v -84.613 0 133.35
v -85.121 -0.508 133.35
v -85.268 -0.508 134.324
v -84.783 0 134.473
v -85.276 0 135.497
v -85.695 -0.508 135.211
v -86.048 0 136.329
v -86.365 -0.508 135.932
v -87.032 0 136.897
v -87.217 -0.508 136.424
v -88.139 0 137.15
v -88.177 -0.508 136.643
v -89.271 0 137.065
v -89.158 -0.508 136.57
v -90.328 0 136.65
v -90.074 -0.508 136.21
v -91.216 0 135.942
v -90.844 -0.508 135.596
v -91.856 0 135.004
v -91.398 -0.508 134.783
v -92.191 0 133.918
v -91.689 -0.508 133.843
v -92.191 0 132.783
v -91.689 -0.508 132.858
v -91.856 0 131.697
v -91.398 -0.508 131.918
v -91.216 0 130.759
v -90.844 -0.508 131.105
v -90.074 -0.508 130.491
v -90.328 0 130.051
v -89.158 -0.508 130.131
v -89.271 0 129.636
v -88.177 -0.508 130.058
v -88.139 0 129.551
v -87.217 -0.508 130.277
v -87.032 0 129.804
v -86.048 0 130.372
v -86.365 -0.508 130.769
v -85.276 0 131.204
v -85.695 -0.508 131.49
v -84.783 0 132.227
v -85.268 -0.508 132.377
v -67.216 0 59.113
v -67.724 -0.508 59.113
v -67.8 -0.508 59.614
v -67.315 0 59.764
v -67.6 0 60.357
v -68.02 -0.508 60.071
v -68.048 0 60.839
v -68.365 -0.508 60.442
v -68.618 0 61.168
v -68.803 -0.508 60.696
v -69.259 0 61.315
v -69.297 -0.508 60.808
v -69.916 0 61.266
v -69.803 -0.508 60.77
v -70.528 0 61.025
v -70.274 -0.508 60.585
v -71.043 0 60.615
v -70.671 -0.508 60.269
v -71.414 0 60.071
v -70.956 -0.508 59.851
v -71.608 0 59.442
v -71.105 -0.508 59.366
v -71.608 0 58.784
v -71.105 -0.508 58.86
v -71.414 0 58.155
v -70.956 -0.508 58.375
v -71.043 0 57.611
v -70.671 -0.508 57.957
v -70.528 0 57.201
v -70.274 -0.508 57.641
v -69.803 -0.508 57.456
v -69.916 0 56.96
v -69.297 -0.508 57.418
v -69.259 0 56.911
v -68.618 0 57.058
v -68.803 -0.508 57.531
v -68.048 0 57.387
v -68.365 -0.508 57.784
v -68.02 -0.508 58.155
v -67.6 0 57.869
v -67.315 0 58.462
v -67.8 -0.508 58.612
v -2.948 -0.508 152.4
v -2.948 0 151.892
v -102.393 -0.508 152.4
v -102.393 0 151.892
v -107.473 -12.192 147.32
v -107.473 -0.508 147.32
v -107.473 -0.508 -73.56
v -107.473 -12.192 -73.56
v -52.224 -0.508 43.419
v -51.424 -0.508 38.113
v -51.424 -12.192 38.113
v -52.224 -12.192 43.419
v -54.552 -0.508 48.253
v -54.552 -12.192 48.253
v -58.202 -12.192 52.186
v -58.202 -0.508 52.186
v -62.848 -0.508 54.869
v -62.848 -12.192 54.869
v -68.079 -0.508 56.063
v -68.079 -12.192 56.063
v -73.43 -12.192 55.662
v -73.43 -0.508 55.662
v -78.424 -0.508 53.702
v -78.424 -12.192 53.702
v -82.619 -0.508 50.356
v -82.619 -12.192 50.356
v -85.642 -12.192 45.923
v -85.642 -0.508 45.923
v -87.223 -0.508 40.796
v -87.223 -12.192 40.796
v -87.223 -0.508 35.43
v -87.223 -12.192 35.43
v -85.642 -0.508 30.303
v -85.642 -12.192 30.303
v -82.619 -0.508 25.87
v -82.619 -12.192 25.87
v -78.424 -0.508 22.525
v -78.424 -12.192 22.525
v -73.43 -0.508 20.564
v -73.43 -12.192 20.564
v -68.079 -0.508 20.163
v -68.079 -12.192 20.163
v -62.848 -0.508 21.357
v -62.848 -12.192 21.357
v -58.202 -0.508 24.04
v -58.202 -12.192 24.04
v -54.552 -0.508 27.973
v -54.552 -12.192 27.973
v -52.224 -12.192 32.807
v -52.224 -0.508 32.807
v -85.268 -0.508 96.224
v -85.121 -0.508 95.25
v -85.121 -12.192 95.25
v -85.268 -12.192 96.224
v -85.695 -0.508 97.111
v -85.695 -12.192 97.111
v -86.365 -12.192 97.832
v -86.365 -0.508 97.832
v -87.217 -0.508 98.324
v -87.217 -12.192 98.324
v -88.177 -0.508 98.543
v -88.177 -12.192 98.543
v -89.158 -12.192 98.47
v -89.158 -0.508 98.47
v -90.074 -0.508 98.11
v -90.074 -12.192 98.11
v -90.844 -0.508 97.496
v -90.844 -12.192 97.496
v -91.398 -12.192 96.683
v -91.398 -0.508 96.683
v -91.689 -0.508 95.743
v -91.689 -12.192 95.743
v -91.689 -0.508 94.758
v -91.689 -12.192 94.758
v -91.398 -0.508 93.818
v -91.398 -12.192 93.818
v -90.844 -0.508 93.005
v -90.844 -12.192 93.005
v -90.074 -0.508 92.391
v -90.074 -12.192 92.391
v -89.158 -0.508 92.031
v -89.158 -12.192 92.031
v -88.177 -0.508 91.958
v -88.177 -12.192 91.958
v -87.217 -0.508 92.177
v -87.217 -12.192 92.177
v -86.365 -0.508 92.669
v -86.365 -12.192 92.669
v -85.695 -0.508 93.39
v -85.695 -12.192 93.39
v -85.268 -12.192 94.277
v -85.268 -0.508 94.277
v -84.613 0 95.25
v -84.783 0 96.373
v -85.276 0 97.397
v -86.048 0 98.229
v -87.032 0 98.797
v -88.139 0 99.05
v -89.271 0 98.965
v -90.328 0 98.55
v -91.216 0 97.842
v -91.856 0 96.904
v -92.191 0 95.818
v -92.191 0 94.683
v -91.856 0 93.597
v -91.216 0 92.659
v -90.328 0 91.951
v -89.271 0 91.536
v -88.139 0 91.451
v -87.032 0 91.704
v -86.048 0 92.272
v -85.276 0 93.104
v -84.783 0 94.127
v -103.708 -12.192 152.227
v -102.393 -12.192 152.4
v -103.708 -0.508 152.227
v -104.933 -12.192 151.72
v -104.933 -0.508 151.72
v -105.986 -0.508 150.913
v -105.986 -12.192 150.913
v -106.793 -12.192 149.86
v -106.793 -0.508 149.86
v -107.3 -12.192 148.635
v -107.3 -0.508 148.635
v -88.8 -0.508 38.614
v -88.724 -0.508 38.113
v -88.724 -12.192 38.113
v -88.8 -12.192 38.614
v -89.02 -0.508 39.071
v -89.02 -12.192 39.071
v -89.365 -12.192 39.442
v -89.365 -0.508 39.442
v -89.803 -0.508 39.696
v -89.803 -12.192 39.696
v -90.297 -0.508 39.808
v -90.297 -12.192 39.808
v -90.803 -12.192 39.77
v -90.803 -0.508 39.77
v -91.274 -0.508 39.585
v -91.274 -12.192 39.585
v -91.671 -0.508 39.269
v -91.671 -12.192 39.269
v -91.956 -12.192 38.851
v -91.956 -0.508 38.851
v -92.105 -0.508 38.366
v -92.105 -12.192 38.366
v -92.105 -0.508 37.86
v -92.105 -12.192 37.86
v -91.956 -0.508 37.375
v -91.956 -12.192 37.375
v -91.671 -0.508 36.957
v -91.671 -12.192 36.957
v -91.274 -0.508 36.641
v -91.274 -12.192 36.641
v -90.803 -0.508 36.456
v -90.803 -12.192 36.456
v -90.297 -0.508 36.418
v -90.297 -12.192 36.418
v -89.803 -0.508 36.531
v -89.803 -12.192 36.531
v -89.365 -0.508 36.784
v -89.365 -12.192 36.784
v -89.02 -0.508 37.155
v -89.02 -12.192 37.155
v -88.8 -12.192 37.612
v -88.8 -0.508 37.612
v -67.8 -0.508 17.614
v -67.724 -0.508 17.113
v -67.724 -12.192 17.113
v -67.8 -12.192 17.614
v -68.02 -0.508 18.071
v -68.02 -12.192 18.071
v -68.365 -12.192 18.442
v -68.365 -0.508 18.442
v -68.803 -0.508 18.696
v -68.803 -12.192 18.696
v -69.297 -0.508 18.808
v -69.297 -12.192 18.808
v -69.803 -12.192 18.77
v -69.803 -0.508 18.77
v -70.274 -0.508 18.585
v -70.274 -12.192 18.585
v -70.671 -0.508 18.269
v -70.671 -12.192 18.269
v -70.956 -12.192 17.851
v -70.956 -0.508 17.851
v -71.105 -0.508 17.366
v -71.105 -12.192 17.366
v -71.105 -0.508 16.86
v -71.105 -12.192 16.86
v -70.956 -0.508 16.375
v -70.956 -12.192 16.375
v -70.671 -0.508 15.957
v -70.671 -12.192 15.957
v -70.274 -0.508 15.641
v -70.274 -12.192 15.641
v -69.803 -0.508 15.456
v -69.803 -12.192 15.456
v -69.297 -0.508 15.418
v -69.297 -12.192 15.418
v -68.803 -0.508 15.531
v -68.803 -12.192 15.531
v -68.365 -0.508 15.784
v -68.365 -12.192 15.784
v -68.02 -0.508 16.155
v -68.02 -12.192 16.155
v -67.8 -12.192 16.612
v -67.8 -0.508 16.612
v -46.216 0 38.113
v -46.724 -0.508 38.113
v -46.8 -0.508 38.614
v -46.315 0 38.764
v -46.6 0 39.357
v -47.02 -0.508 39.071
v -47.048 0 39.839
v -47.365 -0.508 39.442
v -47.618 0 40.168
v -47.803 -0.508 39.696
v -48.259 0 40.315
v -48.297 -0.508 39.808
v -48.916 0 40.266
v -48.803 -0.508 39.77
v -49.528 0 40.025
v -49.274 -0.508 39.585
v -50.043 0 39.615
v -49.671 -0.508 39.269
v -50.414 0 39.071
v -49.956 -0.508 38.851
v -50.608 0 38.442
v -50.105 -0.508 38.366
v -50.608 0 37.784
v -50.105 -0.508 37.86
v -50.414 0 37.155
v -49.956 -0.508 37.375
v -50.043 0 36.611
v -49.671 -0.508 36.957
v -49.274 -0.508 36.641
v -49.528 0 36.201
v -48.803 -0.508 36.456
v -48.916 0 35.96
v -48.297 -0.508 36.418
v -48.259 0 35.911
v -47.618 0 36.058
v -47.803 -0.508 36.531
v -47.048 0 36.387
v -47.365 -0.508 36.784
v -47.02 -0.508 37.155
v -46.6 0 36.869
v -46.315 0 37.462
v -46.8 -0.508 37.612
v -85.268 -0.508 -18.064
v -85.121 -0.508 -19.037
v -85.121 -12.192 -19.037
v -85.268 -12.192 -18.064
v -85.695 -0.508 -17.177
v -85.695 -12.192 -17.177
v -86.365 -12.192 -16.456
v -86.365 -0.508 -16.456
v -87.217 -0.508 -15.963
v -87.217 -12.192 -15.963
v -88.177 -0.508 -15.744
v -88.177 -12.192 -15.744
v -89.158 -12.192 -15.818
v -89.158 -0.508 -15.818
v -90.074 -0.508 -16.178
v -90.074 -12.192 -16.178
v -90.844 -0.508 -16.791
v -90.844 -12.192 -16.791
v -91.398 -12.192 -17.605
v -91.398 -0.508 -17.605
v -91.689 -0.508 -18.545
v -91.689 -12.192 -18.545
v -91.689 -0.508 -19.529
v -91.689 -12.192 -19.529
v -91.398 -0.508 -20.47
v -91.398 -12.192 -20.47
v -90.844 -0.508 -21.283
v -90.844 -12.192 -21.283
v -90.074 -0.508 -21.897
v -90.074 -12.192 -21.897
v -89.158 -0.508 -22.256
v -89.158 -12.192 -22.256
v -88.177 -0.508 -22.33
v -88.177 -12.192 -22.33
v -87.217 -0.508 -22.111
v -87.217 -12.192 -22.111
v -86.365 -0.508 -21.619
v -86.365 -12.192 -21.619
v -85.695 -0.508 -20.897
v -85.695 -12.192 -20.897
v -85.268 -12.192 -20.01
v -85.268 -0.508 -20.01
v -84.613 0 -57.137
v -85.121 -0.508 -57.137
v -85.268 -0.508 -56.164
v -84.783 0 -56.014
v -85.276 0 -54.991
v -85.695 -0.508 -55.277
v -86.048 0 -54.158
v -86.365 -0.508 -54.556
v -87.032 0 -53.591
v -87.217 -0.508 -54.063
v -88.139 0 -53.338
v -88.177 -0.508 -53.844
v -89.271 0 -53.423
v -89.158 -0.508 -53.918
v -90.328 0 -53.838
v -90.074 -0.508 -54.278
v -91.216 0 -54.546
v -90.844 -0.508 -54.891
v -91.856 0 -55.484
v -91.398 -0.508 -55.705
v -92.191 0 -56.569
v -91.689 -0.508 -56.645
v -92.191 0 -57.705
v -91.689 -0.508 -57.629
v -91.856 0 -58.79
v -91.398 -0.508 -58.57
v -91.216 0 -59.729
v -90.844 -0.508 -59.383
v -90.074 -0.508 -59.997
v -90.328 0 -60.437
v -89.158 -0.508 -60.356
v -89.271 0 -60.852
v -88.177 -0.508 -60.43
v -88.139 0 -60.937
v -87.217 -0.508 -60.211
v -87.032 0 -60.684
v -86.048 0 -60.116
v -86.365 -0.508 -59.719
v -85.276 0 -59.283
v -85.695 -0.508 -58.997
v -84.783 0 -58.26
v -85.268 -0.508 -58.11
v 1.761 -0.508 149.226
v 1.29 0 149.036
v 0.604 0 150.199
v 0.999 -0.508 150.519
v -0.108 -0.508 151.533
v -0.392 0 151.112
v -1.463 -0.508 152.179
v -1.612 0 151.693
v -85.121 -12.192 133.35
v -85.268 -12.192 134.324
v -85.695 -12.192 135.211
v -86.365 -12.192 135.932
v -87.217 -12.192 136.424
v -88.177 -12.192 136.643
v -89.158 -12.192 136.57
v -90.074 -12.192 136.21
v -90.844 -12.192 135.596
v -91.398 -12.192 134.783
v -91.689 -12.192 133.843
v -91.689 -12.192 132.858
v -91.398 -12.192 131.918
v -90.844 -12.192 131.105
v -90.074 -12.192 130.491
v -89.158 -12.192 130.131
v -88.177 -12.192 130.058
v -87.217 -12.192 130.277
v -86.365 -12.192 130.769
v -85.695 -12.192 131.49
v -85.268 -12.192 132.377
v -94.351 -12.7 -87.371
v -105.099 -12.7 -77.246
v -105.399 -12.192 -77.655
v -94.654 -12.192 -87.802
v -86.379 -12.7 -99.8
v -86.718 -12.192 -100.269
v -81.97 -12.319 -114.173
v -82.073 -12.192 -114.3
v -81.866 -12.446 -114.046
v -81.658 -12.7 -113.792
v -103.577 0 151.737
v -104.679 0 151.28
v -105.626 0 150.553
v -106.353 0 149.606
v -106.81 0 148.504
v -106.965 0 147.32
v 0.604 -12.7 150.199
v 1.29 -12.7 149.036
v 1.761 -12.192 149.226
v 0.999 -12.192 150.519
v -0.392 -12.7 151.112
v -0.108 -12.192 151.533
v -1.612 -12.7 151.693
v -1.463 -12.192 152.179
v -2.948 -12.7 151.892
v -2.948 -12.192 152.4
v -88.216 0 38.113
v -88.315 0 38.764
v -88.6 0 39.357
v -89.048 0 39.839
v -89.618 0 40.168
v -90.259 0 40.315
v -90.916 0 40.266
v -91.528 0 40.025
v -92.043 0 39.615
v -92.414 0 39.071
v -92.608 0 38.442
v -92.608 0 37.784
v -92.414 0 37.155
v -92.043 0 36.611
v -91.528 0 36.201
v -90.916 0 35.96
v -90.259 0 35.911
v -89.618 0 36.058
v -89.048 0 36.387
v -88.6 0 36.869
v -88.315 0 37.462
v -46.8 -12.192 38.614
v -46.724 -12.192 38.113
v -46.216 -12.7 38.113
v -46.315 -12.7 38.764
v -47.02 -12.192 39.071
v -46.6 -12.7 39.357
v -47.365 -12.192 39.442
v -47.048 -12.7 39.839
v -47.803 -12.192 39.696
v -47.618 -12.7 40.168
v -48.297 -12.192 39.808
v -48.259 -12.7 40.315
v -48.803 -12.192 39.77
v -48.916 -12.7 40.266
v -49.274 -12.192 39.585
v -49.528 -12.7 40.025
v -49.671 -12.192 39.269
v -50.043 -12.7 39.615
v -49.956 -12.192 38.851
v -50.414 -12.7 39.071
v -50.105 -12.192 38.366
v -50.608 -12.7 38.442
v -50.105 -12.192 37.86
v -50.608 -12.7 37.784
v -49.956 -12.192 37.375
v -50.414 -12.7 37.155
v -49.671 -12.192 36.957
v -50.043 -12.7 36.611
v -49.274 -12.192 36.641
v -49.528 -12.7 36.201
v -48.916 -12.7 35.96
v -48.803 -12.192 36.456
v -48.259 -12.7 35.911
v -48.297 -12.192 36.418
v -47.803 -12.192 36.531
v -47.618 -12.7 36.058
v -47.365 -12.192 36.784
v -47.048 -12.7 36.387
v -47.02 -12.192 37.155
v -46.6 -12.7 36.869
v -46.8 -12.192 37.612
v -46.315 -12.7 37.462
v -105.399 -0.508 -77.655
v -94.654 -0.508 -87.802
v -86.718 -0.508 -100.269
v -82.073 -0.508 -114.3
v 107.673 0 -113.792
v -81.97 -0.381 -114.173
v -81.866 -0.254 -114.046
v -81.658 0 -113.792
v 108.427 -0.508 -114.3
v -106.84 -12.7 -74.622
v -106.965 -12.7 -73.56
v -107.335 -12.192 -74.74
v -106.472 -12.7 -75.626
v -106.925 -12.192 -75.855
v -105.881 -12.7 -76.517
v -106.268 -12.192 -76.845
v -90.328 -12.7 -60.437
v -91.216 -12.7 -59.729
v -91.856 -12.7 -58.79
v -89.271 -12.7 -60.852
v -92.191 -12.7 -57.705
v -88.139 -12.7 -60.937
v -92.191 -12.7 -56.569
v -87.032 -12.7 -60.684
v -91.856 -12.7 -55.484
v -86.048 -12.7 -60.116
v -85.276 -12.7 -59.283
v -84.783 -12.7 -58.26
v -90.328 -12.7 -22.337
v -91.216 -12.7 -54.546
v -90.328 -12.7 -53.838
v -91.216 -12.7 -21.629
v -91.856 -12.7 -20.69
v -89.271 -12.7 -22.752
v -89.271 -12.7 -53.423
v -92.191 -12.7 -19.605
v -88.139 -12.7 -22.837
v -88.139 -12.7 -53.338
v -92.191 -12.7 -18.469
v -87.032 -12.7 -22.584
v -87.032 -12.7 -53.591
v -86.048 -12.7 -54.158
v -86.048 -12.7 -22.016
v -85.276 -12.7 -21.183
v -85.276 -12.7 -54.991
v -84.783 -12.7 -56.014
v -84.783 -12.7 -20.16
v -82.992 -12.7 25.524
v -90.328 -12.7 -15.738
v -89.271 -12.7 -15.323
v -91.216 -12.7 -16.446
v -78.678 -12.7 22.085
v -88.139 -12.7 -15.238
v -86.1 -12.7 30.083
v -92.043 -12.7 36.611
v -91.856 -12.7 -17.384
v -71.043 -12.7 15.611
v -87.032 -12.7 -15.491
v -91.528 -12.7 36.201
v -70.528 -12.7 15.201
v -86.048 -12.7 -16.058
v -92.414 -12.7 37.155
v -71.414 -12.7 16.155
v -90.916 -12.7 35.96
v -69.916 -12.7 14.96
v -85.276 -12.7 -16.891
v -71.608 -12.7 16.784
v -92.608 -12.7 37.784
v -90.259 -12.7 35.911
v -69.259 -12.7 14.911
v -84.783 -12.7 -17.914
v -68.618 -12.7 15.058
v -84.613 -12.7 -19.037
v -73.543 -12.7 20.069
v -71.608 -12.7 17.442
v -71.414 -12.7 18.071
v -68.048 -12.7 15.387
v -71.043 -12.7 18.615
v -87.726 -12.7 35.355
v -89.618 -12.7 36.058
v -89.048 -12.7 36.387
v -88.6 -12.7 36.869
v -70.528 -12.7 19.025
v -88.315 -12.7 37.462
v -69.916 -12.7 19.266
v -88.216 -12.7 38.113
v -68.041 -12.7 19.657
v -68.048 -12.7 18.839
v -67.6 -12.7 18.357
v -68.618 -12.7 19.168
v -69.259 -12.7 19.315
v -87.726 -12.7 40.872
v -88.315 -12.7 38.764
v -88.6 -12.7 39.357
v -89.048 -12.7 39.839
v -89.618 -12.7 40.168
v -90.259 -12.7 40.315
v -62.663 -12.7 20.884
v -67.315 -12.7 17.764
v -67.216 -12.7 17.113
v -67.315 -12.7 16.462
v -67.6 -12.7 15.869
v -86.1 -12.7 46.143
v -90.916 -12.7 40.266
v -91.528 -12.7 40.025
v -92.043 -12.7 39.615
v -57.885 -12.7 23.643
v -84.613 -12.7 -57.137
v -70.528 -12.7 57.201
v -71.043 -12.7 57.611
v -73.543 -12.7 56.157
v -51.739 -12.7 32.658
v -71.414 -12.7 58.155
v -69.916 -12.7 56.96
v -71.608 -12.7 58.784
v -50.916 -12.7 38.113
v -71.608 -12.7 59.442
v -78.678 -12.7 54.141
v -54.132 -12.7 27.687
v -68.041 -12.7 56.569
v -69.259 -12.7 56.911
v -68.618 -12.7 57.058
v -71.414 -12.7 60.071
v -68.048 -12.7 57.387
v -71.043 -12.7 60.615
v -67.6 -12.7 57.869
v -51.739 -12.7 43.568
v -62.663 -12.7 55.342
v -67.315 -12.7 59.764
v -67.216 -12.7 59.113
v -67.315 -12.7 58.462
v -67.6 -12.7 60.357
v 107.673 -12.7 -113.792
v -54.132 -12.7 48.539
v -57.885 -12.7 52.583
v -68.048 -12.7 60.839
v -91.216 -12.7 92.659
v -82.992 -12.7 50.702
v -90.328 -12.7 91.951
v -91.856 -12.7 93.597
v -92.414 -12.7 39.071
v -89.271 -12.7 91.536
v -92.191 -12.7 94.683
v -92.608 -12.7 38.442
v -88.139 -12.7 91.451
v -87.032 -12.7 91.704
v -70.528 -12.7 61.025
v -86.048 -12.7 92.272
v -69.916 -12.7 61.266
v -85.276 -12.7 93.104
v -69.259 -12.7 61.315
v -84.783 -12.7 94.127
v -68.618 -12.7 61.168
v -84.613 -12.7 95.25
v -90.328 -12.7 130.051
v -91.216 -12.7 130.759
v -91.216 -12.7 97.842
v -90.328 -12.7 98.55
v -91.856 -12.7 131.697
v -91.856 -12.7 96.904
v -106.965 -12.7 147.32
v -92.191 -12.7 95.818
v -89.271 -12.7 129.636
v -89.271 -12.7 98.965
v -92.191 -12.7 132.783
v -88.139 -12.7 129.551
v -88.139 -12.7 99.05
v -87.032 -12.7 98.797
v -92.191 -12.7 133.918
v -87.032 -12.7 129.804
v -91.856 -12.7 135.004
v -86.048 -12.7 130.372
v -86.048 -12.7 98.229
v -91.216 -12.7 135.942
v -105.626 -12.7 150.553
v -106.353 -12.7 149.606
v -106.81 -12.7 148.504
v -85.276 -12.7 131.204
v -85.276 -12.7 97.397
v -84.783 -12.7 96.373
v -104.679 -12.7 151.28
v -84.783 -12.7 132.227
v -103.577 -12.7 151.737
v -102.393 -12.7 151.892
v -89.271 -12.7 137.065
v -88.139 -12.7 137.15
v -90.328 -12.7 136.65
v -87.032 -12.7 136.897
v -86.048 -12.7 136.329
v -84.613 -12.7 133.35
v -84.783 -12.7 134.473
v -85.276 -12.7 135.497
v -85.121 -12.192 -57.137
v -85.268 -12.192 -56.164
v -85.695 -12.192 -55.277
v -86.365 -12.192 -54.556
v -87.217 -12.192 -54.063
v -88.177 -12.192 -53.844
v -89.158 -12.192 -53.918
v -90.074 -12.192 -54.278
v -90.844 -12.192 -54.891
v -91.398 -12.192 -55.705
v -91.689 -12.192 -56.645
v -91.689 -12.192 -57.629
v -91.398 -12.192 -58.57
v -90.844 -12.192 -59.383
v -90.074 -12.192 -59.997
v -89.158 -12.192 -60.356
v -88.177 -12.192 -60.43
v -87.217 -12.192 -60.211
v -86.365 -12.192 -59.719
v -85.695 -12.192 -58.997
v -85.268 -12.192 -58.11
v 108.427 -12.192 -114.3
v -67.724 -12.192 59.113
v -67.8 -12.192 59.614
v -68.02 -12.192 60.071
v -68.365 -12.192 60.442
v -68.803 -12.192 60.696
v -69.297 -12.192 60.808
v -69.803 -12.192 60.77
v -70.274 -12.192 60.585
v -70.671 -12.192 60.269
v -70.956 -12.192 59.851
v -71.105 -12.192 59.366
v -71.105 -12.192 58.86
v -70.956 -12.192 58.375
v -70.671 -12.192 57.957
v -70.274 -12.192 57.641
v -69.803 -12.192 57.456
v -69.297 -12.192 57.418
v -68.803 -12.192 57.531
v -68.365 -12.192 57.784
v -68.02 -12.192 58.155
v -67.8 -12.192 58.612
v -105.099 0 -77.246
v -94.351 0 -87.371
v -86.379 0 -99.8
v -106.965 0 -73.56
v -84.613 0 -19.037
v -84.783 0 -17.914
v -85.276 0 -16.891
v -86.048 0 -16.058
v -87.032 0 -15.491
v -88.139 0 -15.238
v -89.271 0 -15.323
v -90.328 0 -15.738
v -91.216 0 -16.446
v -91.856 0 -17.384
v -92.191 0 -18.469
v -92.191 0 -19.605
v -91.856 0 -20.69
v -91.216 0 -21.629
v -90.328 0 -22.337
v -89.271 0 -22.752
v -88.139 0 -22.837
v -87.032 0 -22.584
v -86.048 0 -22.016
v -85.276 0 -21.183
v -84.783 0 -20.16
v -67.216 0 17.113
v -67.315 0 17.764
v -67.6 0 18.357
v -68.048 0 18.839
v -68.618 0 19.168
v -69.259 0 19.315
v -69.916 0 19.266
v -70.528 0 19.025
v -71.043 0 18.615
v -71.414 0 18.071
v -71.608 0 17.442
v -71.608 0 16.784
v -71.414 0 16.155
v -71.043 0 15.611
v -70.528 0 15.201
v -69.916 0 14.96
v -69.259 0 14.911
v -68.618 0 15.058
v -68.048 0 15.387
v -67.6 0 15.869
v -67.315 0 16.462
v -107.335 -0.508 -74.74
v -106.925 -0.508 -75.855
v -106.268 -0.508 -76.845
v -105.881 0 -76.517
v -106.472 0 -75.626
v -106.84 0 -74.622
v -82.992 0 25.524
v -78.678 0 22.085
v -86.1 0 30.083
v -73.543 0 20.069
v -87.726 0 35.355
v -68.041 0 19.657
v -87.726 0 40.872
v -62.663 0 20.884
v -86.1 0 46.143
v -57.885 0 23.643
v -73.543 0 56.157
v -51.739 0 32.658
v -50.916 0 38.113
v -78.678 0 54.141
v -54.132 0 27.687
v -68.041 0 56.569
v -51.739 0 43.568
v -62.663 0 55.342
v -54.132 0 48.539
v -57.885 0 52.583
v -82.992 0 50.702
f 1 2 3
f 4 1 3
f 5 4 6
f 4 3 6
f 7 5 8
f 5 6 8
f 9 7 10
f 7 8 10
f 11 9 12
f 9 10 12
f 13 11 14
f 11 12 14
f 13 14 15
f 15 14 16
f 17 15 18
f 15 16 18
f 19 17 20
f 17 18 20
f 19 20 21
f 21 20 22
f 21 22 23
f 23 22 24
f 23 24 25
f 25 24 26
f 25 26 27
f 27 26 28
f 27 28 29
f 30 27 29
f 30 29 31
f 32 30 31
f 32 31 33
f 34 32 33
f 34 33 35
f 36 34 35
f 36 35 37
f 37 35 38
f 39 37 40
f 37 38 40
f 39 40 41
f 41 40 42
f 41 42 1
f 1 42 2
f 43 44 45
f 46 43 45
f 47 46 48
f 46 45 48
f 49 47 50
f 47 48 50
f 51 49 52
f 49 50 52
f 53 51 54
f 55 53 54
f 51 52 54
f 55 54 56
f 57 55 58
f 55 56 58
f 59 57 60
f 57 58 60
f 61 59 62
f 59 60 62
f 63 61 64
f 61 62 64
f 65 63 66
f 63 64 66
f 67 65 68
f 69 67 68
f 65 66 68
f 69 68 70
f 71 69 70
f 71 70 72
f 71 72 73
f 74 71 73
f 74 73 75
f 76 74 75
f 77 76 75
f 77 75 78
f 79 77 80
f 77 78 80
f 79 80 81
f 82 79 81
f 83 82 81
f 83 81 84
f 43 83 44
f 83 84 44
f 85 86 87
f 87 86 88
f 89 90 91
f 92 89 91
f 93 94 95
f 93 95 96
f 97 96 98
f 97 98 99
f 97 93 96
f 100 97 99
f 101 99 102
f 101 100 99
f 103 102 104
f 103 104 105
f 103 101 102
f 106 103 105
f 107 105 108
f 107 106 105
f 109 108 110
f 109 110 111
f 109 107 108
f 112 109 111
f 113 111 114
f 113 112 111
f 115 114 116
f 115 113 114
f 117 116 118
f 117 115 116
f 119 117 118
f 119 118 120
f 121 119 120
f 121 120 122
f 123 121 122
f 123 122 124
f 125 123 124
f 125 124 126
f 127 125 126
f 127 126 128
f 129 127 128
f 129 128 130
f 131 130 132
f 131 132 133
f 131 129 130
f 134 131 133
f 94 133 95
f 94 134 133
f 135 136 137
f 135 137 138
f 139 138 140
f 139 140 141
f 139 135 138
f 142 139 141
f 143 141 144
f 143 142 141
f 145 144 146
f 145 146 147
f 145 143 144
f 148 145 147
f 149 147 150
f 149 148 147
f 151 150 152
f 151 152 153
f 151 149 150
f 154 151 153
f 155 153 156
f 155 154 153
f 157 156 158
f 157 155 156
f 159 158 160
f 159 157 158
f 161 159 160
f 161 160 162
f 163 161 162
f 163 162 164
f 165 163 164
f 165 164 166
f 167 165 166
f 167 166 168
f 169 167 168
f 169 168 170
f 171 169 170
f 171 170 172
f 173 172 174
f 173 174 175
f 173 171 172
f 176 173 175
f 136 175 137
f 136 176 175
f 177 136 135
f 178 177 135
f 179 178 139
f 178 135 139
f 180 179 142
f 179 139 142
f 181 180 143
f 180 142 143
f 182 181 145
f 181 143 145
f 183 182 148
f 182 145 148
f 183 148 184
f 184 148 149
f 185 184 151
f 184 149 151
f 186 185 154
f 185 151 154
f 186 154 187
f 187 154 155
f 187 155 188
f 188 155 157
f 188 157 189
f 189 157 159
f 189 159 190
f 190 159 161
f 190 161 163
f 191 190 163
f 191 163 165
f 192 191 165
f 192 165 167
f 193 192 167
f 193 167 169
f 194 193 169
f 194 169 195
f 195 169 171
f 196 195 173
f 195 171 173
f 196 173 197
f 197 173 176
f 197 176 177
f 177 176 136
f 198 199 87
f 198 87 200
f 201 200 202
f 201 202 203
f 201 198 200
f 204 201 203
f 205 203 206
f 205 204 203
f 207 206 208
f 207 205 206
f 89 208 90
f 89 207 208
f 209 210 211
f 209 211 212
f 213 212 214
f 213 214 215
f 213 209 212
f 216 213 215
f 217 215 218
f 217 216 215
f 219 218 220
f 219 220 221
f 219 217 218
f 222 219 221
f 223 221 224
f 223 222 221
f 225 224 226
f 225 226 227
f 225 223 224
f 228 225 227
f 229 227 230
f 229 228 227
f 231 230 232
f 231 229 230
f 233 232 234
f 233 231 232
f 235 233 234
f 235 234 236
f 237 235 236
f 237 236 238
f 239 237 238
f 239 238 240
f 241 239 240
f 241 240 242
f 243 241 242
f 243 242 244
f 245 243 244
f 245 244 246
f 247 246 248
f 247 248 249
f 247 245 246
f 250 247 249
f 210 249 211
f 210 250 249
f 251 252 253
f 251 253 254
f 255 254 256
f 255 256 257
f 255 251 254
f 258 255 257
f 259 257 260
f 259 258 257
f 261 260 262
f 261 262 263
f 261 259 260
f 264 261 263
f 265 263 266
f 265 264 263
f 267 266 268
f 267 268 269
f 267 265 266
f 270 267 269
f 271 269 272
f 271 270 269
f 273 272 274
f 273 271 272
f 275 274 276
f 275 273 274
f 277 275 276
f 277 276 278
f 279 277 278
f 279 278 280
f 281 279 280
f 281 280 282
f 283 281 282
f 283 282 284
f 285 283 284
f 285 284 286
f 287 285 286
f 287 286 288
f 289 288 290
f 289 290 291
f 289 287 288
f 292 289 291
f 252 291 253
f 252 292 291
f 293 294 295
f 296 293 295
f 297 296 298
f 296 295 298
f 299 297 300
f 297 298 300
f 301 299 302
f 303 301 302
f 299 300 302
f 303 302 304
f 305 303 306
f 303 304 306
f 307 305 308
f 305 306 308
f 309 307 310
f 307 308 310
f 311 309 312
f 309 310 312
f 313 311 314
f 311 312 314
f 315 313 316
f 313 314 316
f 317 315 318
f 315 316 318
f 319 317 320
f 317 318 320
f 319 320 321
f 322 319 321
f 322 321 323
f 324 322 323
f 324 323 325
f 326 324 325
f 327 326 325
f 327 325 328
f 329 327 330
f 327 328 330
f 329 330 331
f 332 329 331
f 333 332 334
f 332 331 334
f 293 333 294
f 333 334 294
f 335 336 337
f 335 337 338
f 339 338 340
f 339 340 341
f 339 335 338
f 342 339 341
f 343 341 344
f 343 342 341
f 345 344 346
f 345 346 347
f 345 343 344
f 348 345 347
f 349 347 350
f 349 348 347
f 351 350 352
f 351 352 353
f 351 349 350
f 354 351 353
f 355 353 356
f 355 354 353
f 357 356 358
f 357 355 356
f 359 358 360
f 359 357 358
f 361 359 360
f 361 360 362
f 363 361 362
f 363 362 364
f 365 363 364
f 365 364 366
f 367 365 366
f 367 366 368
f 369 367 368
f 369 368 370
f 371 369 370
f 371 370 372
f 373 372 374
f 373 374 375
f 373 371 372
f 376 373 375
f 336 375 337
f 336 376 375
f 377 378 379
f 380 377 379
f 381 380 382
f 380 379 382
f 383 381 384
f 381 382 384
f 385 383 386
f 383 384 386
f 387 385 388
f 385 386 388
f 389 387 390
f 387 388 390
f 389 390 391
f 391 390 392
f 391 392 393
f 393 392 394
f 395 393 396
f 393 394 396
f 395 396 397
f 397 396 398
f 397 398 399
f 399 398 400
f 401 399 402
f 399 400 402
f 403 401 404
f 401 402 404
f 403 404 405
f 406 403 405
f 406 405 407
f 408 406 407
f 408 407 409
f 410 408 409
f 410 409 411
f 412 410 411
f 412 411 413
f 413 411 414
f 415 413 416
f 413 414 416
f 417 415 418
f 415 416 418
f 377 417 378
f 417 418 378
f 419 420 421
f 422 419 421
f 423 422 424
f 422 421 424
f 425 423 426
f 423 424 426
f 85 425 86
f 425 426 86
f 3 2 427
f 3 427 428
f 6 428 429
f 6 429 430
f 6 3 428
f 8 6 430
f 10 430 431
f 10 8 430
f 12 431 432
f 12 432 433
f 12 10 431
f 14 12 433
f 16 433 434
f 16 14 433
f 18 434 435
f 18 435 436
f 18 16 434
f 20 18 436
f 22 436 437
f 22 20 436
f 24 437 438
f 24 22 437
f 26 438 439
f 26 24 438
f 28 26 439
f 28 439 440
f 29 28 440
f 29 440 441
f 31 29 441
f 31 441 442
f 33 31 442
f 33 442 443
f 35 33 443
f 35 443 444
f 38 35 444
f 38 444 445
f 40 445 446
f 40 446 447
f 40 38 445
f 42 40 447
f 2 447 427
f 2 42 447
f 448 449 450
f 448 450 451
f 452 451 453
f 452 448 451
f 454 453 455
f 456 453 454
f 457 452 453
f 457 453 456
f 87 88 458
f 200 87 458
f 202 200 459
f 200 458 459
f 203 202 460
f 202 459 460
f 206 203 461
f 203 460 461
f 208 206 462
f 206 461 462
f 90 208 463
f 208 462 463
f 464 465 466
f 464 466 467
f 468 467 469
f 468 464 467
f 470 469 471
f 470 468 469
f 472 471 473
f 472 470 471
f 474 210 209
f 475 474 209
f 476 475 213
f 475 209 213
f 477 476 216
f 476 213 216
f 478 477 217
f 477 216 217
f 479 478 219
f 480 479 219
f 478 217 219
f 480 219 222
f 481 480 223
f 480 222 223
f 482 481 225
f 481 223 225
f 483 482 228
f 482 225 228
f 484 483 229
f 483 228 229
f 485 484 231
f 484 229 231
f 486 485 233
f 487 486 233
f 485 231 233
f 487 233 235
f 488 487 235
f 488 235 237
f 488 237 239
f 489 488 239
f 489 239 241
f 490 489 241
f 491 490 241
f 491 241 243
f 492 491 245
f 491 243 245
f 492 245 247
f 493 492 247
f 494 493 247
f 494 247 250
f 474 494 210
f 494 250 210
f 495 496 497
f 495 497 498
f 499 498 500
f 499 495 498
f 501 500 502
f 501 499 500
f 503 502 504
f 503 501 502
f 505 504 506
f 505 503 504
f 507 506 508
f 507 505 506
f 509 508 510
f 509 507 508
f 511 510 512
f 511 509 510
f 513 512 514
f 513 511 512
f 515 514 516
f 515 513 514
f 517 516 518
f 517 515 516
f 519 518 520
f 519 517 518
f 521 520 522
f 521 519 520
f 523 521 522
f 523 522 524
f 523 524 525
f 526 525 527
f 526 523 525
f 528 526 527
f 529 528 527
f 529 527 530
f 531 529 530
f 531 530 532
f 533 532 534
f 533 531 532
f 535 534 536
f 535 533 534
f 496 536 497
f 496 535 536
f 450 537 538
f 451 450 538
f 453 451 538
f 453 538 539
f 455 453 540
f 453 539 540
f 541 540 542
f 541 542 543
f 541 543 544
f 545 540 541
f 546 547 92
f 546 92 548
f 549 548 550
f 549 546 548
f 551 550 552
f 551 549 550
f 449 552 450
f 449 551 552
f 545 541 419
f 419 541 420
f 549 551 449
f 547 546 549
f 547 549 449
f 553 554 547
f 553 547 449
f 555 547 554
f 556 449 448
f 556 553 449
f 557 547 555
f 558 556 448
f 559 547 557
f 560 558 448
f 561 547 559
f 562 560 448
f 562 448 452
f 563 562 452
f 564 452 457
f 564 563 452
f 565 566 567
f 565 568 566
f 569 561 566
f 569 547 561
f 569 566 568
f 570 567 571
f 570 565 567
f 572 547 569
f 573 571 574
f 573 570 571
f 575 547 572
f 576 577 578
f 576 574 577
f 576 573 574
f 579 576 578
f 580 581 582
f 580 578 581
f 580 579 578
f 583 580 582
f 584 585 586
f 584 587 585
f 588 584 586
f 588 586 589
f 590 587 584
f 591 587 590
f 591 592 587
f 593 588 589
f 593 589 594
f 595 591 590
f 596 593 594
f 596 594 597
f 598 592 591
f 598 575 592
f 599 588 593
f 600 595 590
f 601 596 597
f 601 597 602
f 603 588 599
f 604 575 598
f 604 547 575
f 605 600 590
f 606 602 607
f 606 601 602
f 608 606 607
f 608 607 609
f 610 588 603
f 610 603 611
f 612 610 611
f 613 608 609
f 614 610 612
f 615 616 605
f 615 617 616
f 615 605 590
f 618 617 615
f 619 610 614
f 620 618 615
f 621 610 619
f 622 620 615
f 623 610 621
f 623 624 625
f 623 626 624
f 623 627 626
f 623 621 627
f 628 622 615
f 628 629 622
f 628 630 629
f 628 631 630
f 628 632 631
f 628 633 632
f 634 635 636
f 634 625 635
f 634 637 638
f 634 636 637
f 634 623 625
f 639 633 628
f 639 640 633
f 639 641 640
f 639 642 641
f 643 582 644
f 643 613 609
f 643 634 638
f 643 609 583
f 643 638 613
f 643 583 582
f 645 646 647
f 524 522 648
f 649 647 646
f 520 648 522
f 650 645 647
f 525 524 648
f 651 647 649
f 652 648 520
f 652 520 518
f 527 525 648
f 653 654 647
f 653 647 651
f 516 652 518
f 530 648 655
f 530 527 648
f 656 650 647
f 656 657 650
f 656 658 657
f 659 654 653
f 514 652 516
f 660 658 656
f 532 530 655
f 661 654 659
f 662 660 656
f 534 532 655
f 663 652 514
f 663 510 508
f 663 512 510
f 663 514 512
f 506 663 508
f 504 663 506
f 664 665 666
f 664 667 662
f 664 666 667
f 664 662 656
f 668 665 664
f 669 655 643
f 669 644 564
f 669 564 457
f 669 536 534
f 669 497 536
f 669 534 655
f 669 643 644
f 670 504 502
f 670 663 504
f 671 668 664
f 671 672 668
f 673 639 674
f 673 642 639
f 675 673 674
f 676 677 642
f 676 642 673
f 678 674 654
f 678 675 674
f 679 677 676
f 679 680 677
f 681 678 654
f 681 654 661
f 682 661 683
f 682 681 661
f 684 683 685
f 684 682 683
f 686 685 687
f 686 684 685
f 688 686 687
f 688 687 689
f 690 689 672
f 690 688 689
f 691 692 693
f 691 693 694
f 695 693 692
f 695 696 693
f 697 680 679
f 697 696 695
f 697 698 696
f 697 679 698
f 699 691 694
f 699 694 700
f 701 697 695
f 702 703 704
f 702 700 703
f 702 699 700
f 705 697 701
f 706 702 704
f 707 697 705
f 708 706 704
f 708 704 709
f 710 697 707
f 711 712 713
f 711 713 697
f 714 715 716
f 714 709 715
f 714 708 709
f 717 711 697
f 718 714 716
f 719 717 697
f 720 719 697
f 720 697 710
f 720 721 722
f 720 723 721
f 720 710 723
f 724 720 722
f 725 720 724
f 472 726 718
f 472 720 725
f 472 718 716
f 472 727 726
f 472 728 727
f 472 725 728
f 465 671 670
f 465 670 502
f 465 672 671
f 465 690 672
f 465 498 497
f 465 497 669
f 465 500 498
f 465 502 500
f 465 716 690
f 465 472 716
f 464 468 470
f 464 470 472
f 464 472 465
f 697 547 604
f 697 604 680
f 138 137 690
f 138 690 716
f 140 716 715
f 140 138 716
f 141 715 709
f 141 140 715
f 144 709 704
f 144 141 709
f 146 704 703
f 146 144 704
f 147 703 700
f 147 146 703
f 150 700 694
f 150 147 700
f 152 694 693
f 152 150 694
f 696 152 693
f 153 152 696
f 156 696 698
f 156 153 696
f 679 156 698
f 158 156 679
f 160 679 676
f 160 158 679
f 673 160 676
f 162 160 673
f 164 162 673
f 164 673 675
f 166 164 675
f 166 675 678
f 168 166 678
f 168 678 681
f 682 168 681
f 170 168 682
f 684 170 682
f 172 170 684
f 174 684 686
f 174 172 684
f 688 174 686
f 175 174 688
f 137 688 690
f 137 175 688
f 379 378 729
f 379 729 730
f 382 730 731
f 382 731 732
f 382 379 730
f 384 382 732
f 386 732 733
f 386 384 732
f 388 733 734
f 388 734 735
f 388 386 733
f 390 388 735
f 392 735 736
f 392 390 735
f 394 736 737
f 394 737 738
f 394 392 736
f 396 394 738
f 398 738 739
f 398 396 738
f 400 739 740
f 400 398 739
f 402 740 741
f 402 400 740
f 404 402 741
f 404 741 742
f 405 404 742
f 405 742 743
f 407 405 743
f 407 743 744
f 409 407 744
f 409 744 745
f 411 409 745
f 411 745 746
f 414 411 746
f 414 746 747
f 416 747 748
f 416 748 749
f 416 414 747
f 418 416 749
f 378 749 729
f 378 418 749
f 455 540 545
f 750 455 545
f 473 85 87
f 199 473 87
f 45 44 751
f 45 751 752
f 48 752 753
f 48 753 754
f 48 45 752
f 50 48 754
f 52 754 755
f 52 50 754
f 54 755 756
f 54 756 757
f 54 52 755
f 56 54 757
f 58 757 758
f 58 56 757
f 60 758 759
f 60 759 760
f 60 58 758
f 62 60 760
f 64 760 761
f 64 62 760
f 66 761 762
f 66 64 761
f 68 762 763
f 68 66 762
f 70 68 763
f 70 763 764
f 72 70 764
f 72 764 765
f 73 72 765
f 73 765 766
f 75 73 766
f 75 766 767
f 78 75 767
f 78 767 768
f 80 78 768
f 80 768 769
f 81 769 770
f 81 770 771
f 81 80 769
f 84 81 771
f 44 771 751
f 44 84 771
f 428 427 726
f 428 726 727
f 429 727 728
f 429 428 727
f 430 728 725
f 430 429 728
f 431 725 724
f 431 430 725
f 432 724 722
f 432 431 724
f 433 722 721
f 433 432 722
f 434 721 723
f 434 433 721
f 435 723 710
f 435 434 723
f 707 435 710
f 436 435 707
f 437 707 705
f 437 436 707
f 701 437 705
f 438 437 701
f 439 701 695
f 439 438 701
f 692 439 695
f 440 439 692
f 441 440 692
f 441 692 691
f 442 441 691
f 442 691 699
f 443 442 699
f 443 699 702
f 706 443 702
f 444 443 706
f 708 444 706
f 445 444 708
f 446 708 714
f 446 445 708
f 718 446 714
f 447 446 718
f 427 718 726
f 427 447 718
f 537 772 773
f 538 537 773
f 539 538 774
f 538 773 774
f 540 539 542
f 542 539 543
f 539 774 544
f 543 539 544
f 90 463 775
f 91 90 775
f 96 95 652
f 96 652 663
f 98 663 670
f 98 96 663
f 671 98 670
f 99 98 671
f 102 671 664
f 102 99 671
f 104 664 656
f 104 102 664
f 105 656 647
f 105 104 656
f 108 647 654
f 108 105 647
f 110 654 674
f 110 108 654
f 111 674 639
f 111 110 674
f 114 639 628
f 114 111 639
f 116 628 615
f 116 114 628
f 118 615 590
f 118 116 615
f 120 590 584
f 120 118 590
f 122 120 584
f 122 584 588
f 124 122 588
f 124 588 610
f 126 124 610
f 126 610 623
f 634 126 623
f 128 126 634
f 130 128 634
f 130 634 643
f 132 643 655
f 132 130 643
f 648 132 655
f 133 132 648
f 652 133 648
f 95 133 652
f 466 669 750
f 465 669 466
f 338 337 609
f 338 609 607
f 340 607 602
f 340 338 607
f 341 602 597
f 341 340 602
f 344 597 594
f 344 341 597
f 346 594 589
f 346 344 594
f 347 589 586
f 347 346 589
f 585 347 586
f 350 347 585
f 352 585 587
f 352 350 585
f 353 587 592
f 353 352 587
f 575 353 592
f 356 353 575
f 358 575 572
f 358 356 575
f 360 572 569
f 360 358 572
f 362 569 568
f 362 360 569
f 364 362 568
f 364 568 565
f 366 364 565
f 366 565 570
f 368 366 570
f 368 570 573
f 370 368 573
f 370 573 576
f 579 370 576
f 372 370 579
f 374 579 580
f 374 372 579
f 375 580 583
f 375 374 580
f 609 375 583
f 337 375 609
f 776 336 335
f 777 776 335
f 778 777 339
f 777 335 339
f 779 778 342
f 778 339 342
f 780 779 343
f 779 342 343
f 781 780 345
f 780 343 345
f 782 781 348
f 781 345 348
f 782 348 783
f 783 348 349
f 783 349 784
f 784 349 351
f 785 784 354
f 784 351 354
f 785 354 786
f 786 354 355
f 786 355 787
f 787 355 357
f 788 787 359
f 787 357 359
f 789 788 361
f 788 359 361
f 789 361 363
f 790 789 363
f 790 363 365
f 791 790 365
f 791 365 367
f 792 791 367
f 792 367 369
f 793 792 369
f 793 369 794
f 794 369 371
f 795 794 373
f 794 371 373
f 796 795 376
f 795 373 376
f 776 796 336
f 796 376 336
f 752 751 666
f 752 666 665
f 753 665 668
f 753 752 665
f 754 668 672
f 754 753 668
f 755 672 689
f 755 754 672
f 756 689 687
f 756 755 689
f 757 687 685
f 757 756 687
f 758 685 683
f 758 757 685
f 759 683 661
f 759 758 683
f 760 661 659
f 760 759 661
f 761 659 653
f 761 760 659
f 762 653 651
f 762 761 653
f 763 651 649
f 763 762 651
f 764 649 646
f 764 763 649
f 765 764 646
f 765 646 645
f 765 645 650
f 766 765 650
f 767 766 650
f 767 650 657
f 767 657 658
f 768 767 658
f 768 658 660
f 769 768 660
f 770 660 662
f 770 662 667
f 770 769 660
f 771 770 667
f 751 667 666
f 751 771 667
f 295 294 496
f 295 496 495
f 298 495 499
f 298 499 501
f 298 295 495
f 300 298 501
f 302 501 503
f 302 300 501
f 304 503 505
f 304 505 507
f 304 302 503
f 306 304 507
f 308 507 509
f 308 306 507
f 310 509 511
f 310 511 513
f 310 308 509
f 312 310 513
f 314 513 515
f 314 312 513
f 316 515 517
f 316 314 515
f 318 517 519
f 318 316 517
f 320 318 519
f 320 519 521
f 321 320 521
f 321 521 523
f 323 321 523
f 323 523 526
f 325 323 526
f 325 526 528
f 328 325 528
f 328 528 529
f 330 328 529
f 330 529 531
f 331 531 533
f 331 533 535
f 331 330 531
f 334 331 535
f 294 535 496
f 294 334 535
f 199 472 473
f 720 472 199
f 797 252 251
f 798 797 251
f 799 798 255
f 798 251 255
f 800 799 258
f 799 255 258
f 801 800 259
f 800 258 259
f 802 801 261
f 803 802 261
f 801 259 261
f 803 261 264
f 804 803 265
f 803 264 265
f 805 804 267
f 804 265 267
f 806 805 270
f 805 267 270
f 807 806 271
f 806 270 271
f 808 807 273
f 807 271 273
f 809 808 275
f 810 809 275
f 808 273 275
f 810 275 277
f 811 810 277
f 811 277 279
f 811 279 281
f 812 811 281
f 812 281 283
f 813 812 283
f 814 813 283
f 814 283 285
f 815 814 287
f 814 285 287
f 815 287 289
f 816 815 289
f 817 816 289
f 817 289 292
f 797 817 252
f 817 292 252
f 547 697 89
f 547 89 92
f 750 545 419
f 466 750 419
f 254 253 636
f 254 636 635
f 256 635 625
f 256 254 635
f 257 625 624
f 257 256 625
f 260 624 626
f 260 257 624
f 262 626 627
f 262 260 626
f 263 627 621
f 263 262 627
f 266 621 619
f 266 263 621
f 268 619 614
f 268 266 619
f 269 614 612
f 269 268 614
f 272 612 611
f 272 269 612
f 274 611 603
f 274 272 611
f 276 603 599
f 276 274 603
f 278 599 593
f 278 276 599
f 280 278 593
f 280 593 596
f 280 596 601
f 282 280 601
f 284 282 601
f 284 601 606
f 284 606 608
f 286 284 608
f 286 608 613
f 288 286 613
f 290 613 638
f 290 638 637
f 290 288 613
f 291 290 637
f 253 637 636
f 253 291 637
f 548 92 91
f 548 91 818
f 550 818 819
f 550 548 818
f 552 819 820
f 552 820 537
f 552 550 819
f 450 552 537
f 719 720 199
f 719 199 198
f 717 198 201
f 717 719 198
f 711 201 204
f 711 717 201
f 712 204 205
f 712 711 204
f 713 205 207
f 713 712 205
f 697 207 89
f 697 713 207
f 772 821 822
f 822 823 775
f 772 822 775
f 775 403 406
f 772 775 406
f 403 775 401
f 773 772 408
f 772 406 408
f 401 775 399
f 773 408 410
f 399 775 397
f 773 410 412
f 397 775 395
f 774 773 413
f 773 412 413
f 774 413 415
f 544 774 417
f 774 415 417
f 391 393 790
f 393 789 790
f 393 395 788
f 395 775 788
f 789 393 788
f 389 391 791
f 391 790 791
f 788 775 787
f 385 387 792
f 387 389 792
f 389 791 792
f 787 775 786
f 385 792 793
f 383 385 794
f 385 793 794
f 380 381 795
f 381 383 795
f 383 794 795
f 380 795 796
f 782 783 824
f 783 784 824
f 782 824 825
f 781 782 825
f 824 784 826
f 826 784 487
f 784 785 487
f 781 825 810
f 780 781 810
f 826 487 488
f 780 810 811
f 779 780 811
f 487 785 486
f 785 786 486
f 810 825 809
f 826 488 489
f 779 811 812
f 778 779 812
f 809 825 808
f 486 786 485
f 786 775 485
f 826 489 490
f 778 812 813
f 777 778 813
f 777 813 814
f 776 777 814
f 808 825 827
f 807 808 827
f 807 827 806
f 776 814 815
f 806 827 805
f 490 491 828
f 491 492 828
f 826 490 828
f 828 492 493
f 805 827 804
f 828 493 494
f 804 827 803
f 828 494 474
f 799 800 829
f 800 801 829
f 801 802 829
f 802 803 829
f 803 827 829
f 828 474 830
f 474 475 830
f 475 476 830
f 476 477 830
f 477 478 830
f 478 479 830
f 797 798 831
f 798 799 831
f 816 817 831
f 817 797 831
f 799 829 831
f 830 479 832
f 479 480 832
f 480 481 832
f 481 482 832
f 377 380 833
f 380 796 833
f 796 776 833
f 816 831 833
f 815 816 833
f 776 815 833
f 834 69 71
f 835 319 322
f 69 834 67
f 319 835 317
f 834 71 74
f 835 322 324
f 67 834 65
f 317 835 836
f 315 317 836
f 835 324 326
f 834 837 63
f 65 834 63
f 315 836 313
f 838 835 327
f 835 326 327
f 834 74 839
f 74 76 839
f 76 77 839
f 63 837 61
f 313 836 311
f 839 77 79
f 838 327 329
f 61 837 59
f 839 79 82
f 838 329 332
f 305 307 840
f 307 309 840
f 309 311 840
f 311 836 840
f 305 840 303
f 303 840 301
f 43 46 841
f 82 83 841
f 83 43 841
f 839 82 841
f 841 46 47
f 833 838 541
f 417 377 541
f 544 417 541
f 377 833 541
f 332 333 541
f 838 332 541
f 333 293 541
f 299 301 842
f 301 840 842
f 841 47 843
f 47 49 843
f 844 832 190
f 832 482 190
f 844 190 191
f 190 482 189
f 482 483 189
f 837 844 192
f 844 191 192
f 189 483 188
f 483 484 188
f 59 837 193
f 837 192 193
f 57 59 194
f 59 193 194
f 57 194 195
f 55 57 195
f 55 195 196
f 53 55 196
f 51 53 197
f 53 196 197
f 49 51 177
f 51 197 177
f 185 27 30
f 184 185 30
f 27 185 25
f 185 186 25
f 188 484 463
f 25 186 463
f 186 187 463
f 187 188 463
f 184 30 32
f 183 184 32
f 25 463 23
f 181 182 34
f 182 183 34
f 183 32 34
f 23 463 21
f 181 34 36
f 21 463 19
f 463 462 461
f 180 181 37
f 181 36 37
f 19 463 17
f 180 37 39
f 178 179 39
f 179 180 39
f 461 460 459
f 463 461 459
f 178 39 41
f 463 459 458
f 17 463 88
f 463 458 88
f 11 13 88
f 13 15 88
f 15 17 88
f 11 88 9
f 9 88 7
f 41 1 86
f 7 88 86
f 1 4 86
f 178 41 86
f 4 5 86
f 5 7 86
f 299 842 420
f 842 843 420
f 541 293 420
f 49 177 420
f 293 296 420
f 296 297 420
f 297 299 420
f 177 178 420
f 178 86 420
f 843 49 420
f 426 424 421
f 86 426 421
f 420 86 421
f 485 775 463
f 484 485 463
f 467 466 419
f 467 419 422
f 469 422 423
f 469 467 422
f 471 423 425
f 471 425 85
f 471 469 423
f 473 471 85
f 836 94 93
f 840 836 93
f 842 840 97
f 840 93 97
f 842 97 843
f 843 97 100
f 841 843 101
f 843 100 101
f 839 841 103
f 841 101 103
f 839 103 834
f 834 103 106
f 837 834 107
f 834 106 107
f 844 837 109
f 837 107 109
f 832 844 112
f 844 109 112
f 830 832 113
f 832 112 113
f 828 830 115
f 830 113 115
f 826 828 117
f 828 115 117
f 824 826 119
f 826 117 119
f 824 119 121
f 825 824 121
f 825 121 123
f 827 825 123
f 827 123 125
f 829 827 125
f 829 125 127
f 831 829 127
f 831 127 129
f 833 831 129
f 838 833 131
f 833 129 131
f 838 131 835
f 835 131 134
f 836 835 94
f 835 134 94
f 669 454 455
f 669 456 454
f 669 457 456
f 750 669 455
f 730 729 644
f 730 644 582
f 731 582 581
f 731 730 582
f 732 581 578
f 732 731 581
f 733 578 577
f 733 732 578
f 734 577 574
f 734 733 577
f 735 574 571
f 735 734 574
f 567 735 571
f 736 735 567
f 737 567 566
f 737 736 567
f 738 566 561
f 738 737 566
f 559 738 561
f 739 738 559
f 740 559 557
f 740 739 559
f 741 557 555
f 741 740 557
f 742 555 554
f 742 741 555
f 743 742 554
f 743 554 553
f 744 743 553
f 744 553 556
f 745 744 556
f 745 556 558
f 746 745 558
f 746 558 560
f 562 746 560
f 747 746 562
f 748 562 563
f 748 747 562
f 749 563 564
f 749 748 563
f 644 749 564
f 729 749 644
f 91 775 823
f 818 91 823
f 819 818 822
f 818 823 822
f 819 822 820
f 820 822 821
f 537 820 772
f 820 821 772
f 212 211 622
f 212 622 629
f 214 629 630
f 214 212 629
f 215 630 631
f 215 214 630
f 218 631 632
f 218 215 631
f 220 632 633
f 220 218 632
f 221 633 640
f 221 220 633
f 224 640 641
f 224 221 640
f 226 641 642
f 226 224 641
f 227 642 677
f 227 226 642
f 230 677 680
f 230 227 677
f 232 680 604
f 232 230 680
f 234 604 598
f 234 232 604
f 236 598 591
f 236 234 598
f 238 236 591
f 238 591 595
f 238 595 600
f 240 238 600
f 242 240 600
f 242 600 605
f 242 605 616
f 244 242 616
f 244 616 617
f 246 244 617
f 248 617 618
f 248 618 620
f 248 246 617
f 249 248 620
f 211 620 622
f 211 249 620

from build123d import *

# Parameters (mm, degrees)
F0_R     = 3.302
F0_R_2   = 1.7
F0_R_3   = 18
F1_DEPTH = 12.7
F2_R     = 5.08
F3_SIZE  = 0.508


with BuildPart() as f1:
    # F0 (on Front) → F1 (new body)
    with BuildSketch(Plane.XZ):
        with BuildLine():
            Line((108.426517, -114.299545), (0.476517, 152.400455))
            Line((0.476517, 152.400455), (-107.473483, 152.400455))
            Line((-107.473483, 152.400455), (-107.473483, -76.199545))
            ThreePointArc((-107.473483, -76.199545), (-90.99167, -92.728336), (-82.073483, -114.299545))
            Line((-82.073483, -114.299545), (108.426517, -114.299545))
        make_face()
        with Locations((-88.423483, -57.137189)):
            Circle(F0_R, mode=Mode.SUBTRACT)
        with Locations((-88.423483, -19.037189)):
            Circle(F0_R, mode=Mode.SUBTRACT)
        with Locations((-92.919483, 14.618093)):
            Circle(F0_R_2, mode=Mode.SUBTRACT)
        with Locations((-69.424483, 17.113093)):
            Circle(F0_R_2, mode=Mode.SUBTRACT)
        with Locations((-45.929483, 14.618093)):
            Circle(F0_R_2, mode=Mode.SUBTRACT)
        with Locations((-90.424483, 38.113093)):
            Circle(F0_R_2, mode=Mode.SUBTRACT)
        with Locations((-69.424483, 38.113093)):
            Circle(F0_R_3, mode=Mode.SUBTRACT)
        with Locations((-92.919483, 61.608093)):
            Circle(F0_R_2, mode=Mode.SUBTRACT)
        with Locations((-69.424483, 59.113093)):
            Circle(F0_R_2, mode=Mode.SUBTRACT)
        with Locations((-48.424483, 38.113093)):
            Circle(F0_R_2, mode=Mode.SUBTRACT)
        with Locations((-45.929483, 61.608093)):
            Circle(F0_R_2, mode=Mode.SUBTRACT)
        with Locations((-88.423483, 95.250455)):
            Circle(F0_R, mode=Mode.SUBTRACT)
        with Locations((-88.423483, 133.350455)):
            Circle(F0_R, mode=Mode.SUBTRACT)
        with Locations((-92.919483, 14.618093)):
            Circle(F0_R_2)
        with Locations((-45.929483, 14.618093)):
            Circle(F0_R_2)
        with Locations((-45.929483, 61.608093)):
            Circle(F0_R_2)
        with Locations((-92.919483, 61.608093)):
            Circle(F0_R_2)
    extrude(amount=F1_DEPTH)

    # F2
    f2_edges = [f1.edges().sort_by_distance(p)[0] for p in [
        (-107.473483, -6.35, 152.400455),
        (0.476517, -6.35, 152.400455),
        (-107.473483, -6.35, -76.199545),
    ]]
    fillet(f2_edges, radius=F2_R)

    # F3
    f3_edges = [f1.edges().sort_by_distance(p)[0] for p in [
        (55.093878, -12.7, 17.463445),
        (-0.108282, -12.7, 151.532864),
        (13.176517, -12.7, -114.299545),
        (-52.670567, -12.7, 152.400455),
        (-90.299941, -12.7, -93.790077),
        (-105.985585, -12.7, 150.912558),
        (-106.925335, -12.7, -75.855453),
        (-107.473483, -12.7, 36.880185),
        (-91.725483, -12.7, -57.137189),
        (-91.725483, -12.7, -19.037189),
        (-71.124483, -12.7, 17.113093),
        (-92.124483, -12.7, 38.113093),
        (-87.424483, -12.7, 38.113093),
        (-71.124483, -12.7, 59.113093),
        (-50.124483, -12.7, 38.113093),
        (-91.725483, -12.7, 95.250455),
        (-91.725483, -12.7, 133.350455),
        (55.093878, 0, 17.463445),
        (-0.108282, 0, 151.532864),
        (13.176517, 0, -114.299545),
        (-52.670567, 0, 152.400455),
        (-90.299941, 0, -93.790077),
        (-105.985585, 0, 150.912558),
        (-106.925335, 0, -75.855453),
        (-107.473483, 0, 36.880185),
        (-91.725483, 0, -57.137189),
        (-91.725483, 0, -19.037189),
        (-71.124483, 0, 17.113093),
        (-92.124483, 0, 38.113093),
        (-87.424483, 0, 38.113093),
        (-71.124483, 0, 59.113093),
        (-50.124483, 0, 38.113093),
        (-91.725483, 0, 95.250455),
        (-91.725483, 0, 133.350455),
    ]]
    chamfer(f3_edges, length=F3_SIZE)


solid = f1.part
